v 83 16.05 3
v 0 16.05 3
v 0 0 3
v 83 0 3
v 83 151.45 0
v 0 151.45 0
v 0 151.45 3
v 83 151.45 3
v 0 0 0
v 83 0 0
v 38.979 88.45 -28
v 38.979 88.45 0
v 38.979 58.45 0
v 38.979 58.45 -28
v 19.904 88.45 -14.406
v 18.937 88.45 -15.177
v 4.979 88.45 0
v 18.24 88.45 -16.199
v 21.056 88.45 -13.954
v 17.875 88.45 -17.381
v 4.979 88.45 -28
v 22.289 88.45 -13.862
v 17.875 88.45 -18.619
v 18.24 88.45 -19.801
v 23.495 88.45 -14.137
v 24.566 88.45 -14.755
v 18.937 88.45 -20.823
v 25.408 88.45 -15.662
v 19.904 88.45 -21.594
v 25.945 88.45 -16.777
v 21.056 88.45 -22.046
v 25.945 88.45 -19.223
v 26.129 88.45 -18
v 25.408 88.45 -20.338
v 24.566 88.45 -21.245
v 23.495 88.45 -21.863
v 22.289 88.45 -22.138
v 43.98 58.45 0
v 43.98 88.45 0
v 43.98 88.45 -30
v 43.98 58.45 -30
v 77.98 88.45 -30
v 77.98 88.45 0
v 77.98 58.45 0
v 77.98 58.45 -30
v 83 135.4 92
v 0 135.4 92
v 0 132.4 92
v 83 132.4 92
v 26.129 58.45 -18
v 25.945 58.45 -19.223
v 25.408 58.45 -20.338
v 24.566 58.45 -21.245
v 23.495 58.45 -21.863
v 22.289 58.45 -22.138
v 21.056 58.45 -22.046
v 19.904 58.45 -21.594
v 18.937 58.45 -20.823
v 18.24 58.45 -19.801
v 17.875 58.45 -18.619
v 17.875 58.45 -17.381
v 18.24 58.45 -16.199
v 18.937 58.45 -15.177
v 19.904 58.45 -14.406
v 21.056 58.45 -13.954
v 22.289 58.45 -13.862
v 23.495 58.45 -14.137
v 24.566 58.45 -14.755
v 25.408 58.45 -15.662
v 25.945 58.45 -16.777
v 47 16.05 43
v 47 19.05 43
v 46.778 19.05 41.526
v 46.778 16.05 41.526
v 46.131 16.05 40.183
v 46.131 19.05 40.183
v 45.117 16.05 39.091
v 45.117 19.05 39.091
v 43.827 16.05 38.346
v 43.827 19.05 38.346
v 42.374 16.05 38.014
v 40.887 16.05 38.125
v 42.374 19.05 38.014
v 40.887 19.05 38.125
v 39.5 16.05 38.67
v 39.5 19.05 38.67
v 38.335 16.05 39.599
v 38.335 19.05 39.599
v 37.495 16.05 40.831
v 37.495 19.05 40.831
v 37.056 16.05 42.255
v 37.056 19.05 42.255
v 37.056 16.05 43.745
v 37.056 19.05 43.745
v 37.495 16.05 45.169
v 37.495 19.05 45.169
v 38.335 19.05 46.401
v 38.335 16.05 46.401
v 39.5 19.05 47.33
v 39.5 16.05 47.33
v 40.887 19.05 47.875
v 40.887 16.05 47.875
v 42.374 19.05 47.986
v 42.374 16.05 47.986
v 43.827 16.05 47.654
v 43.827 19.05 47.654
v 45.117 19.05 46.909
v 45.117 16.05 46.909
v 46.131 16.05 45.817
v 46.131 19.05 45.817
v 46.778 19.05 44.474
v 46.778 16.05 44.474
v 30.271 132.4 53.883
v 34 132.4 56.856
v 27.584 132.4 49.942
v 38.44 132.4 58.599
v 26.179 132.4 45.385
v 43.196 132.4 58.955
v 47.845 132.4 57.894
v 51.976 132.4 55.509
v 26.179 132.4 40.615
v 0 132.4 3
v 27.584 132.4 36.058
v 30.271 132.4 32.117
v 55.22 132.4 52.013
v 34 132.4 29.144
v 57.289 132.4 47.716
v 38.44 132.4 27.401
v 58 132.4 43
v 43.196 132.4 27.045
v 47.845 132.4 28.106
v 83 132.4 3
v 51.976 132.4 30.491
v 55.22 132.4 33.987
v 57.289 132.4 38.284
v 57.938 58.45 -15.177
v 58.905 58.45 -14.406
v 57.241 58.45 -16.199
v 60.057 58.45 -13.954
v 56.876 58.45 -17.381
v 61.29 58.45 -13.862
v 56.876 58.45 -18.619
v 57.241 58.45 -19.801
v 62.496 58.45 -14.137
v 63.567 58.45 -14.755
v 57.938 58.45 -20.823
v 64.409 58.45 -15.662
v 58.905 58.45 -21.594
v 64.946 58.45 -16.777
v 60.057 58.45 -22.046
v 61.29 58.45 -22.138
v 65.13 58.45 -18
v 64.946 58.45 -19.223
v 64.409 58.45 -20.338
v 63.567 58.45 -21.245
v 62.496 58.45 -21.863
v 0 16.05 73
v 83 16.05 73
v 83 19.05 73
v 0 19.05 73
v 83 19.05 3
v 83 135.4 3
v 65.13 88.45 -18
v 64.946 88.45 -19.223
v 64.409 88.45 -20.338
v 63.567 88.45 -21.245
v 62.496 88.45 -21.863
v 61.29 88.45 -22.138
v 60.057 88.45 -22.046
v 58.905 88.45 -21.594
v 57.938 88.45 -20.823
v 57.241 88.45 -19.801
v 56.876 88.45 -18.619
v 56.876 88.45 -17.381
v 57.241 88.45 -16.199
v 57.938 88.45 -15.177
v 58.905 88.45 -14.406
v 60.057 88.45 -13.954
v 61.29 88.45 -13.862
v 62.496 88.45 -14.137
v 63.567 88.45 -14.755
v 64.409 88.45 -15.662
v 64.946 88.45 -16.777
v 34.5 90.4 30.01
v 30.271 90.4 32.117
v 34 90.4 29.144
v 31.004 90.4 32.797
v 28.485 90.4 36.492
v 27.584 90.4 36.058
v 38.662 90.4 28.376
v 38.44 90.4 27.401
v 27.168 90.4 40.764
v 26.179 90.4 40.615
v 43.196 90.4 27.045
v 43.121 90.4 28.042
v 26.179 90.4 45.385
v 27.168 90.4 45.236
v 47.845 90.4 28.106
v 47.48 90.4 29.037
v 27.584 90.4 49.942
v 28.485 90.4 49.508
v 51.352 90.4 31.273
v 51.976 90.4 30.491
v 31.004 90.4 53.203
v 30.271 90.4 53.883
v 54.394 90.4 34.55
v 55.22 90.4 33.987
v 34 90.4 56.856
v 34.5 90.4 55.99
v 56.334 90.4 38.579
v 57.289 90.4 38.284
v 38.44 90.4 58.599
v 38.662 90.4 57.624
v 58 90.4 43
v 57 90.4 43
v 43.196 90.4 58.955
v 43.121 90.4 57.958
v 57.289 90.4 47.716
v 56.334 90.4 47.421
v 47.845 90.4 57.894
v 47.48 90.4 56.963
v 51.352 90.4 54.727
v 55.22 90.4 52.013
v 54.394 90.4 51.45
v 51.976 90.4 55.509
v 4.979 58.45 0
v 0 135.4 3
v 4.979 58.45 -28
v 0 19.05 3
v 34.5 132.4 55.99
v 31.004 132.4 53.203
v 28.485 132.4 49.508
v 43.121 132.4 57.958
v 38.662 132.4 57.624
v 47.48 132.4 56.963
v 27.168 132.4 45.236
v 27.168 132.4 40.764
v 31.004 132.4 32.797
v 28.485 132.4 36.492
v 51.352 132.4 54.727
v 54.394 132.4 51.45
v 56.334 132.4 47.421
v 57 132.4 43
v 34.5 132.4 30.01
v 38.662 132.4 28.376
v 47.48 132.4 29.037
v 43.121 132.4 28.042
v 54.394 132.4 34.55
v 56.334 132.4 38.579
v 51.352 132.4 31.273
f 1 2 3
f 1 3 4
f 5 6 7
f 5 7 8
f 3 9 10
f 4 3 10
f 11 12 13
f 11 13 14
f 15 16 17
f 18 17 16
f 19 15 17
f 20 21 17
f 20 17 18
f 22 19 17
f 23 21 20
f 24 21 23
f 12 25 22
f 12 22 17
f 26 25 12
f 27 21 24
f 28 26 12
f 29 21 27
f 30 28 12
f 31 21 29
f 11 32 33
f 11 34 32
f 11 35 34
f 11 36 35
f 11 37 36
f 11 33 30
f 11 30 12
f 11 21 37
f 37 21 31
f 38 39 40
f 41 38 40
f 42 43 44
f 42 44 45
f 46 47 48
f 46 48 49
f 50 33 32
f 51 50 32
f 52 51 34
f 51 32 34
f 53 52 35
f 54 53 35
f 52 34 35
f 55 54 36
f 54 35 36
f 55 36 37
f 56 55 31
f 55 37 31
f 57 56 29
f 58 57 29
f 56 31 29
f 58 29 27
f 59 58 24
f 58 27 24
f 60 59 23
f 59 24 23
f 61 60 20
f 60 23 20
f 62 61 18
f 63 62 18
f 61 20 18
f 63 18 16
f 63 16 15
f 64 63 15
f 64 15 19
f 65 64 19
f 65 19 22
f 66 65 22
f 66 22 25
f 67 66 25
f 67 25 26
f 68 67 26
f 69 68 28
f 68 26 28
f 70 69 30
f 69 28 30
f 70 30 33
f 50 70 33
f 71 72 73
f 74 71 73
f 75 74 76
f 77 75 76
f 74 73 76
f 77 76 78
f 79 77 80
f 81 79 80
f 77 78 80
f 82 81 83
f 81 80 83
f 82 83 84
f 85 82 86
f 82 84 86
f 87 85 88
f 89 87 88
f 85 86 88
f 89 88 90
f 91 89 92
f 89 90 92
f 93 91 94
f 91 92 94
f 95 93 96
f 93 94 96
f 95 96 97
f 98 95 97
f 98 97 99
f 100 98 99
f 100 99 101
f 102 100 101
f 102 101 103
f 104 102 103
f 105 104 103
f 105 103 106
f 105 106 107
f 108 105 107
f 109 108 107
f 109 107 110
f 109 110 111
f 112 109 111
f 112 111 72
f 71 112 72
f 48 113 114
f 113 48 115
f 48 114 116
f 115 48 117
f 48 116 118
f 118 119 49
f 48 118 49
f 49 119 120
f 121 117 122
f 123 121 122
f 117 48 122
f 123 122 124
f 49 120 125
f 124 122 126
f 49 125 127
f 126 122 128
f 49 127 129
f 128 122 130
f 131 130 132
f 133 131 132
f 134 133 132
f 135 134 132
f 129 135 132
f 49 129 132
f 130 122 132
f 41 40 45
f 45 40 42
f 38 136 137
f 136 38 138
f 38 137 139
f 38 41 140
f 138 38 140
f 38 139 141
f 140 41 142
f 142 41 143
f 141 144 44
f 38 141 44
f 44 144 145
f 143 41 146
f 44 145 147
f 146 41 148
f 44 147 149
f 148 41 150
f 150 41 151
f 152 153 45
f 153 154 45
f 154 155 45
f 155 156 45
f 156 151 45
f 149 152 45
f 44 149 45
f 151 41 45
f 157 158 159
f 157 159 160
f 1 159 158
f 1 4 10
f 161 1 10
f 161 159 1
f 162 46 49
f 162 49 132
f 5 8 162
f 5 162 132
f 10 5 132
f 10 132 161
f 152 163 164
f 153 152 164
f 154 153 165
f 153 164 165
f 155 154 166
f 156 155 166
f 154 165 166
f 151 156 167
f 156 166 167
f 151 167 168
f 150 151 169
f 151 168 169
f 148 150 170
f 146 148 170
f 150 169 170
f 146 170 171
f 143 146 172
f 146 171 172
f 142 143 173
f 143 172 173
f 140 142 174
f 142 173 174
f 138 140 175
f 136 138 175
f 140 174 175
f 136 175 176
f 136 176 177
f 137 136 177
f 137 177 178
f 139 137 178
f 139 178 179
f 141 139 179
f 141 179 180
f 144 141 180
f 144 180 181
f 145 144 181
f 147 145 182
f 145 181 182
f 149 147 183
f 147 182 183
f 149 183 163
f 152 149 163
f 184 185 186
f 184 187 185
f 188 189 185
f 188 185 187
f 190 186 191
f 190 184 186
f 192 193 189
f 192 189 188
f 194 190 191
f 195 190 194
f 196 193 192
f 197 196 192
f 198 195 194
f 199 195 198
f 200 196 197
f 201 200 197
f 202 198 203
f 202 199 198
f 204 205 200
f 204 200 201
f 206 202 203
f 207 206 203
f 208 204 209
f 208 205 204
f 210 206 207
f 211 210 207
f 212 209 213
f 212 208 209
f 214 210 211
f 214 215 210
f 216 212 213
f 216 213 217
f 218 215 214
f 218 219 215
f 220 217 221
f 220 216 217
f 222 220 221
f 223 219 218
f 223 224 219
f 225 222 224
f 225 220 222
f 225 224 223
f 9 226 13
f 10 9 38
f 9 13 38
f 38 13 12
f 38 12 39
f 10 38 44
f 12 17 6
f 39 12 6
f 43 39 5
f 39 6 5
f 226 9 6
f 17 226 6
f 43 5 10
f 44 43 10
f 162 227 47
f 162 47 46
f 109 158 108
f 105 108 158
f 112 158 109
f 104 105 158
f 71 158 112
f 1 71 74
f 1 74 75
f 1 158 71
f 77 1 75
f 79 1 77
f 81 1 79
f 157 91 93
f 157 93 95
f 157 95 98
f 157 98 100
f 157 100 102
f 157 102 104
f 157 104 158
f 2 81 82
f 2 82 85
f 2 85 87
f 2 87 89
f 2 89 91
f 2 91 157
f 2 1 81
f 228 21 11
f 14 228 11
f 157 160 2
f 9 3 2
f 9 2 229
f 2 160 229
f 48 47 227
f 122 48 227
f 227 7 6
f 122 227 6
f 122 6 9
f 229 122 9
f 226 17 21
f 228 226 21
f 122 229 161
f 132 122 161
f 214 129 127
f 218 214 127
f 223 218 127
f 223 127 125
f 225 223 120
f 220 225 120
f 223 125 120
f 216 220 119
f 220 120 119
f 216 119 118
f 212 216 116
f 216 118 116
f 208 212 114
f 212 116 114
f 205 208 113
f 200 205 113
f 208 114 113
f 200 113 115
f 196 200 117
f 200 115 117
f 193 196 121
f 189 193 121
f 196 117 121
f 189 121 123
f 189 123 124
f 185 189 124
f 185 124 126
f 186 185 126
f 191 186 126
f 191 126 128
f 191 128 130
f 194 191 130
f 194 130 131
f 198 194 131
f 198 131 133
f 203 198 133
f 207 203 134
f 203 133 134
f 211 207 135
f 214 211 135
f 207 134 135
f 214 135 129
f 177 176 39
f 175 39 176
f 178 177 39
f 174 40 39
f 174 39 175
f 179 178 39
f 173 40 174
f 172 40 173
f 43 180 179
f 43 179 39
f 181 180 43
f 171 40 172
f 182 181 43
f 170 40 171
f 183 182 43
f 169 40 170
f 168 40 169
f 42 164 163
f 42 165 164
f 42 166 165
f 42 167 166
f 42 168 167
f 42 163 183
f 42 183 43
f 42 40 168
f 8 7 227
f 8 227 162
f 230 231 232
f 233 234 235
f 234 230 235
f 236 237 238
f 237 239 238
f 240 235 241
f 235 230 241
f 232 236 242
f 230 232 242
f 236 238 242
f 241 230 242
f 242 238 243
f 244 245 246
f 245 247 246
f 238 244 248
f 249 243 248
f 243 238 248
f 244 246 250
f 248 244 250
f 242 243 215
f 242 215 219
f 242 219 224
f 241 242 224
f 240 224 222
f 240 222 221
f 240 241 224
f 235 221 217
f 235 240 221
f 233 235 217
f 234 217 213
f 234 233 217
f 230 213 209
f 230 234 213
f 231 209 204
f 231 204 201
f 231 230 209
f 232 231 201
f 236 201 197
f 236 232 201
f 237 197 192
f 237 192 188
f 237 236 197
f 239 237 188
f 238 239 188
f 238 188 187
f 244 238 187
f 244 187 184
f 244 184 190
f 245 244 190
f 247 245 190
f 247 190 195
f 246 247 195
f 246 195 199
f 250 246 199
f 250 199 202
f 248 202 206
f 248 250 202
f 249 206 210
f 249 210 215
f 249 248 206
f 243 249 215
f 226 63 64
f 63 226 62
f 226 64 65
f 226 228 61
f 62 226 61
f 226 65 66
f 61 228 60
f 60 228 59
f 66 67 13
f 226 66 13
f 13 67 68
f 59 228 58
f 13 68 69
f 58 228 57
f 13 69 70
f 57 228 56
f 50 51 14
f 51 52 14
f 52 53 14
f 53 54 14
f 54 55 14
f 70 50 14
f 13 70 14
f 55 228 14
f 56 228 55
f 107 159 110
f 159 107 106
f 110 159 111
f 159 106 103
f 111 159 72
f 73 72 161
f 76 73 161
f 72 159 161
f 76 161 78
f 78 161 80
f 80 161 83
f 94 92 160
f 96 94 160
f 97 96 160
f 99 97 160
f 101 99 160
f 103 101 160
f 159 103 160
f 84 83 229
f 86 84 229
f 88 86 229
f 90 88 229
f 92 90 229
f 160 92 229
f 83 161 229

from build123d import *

# Parameters (mm, degrees)
SKETCH1_W           = 83
SKETCH1_H           = 151.45
BOSS_EXTRUDE1_DEPTH = 3
SKETCH2_W           = 83
SKETCH2_H           = 70
BOSS_EXTRUDE2_DEPTH = 3
SKETCH3_W           = 83
SKETCH3_H           = 89
BOSS_EXTRUDE3_DEPTH = 3
SKETCH6_W           = 34
SKETCH6_H           = 28
SKETCH6_R           = 4.15
SKETCH6_H_2         = 30
BOSS_EXTRUDE6_DEPTH = 30
SKETCH7_R           = 16
SKETCH7_R_2         = 15
BOSS_EXTRUDE7_DEPTH = 42
SKETCH8_R           = 5
CUT_EXTRUDE1_DEPTH  = 20.05


with BuildPart() as part:
    # Sketch1 → Boss-Extrude1 (new body)
    with BuildSketch(Plane.XY):
        with Locations((41.5, 75.725)):
            Rectangle(SKETCH1_W, SKETCH1_H)
    extrude(amount=BOSS_EXTRUDE1_DEPTH)

    # Sketch2 → Boss-Extrude2 (add)
    with BuildSketch(Plane(origin=(0, 16.05, 0), x_dir=(-1, 0, 0), z_dir=(0, -1, 0))):
        with Locations((-41.5, -38)):
            Rectangle(SKETCH2_W, SKETCH2_H)
    boss_extrude2 = extrude(amount=-BOSS_EXTRUDE2_DEPTH)

    # Mirror1: Boss-Extrude2 across plane
    add(boss_extrude2.mirror(Plane.ZX.offset(75.725)))

    # Sketch3 → Boss-Extrude3 (add)
    with BuildSketch(Plane(origin=(0, 135.4, 0), x_dir=(1, 0, 0), z_dir=(0, 1, 0))):
        with Locations((41.5, -47.5)):
            Rectangle(SKETCH3_W, SKETCH3_H)
    extrude(amount=-BOSS_EXTRUDE3_DEPTH)

    # Sketch6 → Boss-Extrude6 (add)
    with BuildSketch(Plane(origin=(0, 88.45, 0), x_dir=(1, 0, 0), z_dir=(0, 1, 0))):
        with Locations((21.979, 14)):
            Rectangle(SKETCH6_W, SKETCH6_H)
        with Locations((21.979, 18)):
            Circle(SKETCH6_R, mode=Mode.SUBTRACT)
        with Locations((60.98, 15)):
            Rectangle(SKETCH6_W, SKETCH6_H_2)
        with Locations((60.98, 18)):
            Circle(SKETCH6_R, mode=Mode.SUBTRACT)
    extrude(amount=-BOSS_EXTRUDE6_DEPTH)

    # Sketch7 → Boss-Extrude7 (add)
    with BuildSketch(Plane.XZ.offset(-132.4)):
        with Locations((42, 43)):
            Circle(SKETCH7_R)
        with Locations((42, 43)):
            Circle(SKETCH7_R_2, mode=Mode.SUBTRACT)
    extrude(amount=BOSS_EXTRUDE7_DEPTH)

    # Sketch8 → Cut-Extrude1 (cut, through all)
    with BuildSketch(Plane(origin=(0, 19.05, 0), x_dir=(1, 0, 0), z_dir=(0, 1, 0))):
        with Locations((42, -43)):
            Circle(SKETCH8_R)
    extrude(amount=-CUT_EXTRUDE1_DEPTH, mode=Mode.SUBTRACT)


solid = part.part
